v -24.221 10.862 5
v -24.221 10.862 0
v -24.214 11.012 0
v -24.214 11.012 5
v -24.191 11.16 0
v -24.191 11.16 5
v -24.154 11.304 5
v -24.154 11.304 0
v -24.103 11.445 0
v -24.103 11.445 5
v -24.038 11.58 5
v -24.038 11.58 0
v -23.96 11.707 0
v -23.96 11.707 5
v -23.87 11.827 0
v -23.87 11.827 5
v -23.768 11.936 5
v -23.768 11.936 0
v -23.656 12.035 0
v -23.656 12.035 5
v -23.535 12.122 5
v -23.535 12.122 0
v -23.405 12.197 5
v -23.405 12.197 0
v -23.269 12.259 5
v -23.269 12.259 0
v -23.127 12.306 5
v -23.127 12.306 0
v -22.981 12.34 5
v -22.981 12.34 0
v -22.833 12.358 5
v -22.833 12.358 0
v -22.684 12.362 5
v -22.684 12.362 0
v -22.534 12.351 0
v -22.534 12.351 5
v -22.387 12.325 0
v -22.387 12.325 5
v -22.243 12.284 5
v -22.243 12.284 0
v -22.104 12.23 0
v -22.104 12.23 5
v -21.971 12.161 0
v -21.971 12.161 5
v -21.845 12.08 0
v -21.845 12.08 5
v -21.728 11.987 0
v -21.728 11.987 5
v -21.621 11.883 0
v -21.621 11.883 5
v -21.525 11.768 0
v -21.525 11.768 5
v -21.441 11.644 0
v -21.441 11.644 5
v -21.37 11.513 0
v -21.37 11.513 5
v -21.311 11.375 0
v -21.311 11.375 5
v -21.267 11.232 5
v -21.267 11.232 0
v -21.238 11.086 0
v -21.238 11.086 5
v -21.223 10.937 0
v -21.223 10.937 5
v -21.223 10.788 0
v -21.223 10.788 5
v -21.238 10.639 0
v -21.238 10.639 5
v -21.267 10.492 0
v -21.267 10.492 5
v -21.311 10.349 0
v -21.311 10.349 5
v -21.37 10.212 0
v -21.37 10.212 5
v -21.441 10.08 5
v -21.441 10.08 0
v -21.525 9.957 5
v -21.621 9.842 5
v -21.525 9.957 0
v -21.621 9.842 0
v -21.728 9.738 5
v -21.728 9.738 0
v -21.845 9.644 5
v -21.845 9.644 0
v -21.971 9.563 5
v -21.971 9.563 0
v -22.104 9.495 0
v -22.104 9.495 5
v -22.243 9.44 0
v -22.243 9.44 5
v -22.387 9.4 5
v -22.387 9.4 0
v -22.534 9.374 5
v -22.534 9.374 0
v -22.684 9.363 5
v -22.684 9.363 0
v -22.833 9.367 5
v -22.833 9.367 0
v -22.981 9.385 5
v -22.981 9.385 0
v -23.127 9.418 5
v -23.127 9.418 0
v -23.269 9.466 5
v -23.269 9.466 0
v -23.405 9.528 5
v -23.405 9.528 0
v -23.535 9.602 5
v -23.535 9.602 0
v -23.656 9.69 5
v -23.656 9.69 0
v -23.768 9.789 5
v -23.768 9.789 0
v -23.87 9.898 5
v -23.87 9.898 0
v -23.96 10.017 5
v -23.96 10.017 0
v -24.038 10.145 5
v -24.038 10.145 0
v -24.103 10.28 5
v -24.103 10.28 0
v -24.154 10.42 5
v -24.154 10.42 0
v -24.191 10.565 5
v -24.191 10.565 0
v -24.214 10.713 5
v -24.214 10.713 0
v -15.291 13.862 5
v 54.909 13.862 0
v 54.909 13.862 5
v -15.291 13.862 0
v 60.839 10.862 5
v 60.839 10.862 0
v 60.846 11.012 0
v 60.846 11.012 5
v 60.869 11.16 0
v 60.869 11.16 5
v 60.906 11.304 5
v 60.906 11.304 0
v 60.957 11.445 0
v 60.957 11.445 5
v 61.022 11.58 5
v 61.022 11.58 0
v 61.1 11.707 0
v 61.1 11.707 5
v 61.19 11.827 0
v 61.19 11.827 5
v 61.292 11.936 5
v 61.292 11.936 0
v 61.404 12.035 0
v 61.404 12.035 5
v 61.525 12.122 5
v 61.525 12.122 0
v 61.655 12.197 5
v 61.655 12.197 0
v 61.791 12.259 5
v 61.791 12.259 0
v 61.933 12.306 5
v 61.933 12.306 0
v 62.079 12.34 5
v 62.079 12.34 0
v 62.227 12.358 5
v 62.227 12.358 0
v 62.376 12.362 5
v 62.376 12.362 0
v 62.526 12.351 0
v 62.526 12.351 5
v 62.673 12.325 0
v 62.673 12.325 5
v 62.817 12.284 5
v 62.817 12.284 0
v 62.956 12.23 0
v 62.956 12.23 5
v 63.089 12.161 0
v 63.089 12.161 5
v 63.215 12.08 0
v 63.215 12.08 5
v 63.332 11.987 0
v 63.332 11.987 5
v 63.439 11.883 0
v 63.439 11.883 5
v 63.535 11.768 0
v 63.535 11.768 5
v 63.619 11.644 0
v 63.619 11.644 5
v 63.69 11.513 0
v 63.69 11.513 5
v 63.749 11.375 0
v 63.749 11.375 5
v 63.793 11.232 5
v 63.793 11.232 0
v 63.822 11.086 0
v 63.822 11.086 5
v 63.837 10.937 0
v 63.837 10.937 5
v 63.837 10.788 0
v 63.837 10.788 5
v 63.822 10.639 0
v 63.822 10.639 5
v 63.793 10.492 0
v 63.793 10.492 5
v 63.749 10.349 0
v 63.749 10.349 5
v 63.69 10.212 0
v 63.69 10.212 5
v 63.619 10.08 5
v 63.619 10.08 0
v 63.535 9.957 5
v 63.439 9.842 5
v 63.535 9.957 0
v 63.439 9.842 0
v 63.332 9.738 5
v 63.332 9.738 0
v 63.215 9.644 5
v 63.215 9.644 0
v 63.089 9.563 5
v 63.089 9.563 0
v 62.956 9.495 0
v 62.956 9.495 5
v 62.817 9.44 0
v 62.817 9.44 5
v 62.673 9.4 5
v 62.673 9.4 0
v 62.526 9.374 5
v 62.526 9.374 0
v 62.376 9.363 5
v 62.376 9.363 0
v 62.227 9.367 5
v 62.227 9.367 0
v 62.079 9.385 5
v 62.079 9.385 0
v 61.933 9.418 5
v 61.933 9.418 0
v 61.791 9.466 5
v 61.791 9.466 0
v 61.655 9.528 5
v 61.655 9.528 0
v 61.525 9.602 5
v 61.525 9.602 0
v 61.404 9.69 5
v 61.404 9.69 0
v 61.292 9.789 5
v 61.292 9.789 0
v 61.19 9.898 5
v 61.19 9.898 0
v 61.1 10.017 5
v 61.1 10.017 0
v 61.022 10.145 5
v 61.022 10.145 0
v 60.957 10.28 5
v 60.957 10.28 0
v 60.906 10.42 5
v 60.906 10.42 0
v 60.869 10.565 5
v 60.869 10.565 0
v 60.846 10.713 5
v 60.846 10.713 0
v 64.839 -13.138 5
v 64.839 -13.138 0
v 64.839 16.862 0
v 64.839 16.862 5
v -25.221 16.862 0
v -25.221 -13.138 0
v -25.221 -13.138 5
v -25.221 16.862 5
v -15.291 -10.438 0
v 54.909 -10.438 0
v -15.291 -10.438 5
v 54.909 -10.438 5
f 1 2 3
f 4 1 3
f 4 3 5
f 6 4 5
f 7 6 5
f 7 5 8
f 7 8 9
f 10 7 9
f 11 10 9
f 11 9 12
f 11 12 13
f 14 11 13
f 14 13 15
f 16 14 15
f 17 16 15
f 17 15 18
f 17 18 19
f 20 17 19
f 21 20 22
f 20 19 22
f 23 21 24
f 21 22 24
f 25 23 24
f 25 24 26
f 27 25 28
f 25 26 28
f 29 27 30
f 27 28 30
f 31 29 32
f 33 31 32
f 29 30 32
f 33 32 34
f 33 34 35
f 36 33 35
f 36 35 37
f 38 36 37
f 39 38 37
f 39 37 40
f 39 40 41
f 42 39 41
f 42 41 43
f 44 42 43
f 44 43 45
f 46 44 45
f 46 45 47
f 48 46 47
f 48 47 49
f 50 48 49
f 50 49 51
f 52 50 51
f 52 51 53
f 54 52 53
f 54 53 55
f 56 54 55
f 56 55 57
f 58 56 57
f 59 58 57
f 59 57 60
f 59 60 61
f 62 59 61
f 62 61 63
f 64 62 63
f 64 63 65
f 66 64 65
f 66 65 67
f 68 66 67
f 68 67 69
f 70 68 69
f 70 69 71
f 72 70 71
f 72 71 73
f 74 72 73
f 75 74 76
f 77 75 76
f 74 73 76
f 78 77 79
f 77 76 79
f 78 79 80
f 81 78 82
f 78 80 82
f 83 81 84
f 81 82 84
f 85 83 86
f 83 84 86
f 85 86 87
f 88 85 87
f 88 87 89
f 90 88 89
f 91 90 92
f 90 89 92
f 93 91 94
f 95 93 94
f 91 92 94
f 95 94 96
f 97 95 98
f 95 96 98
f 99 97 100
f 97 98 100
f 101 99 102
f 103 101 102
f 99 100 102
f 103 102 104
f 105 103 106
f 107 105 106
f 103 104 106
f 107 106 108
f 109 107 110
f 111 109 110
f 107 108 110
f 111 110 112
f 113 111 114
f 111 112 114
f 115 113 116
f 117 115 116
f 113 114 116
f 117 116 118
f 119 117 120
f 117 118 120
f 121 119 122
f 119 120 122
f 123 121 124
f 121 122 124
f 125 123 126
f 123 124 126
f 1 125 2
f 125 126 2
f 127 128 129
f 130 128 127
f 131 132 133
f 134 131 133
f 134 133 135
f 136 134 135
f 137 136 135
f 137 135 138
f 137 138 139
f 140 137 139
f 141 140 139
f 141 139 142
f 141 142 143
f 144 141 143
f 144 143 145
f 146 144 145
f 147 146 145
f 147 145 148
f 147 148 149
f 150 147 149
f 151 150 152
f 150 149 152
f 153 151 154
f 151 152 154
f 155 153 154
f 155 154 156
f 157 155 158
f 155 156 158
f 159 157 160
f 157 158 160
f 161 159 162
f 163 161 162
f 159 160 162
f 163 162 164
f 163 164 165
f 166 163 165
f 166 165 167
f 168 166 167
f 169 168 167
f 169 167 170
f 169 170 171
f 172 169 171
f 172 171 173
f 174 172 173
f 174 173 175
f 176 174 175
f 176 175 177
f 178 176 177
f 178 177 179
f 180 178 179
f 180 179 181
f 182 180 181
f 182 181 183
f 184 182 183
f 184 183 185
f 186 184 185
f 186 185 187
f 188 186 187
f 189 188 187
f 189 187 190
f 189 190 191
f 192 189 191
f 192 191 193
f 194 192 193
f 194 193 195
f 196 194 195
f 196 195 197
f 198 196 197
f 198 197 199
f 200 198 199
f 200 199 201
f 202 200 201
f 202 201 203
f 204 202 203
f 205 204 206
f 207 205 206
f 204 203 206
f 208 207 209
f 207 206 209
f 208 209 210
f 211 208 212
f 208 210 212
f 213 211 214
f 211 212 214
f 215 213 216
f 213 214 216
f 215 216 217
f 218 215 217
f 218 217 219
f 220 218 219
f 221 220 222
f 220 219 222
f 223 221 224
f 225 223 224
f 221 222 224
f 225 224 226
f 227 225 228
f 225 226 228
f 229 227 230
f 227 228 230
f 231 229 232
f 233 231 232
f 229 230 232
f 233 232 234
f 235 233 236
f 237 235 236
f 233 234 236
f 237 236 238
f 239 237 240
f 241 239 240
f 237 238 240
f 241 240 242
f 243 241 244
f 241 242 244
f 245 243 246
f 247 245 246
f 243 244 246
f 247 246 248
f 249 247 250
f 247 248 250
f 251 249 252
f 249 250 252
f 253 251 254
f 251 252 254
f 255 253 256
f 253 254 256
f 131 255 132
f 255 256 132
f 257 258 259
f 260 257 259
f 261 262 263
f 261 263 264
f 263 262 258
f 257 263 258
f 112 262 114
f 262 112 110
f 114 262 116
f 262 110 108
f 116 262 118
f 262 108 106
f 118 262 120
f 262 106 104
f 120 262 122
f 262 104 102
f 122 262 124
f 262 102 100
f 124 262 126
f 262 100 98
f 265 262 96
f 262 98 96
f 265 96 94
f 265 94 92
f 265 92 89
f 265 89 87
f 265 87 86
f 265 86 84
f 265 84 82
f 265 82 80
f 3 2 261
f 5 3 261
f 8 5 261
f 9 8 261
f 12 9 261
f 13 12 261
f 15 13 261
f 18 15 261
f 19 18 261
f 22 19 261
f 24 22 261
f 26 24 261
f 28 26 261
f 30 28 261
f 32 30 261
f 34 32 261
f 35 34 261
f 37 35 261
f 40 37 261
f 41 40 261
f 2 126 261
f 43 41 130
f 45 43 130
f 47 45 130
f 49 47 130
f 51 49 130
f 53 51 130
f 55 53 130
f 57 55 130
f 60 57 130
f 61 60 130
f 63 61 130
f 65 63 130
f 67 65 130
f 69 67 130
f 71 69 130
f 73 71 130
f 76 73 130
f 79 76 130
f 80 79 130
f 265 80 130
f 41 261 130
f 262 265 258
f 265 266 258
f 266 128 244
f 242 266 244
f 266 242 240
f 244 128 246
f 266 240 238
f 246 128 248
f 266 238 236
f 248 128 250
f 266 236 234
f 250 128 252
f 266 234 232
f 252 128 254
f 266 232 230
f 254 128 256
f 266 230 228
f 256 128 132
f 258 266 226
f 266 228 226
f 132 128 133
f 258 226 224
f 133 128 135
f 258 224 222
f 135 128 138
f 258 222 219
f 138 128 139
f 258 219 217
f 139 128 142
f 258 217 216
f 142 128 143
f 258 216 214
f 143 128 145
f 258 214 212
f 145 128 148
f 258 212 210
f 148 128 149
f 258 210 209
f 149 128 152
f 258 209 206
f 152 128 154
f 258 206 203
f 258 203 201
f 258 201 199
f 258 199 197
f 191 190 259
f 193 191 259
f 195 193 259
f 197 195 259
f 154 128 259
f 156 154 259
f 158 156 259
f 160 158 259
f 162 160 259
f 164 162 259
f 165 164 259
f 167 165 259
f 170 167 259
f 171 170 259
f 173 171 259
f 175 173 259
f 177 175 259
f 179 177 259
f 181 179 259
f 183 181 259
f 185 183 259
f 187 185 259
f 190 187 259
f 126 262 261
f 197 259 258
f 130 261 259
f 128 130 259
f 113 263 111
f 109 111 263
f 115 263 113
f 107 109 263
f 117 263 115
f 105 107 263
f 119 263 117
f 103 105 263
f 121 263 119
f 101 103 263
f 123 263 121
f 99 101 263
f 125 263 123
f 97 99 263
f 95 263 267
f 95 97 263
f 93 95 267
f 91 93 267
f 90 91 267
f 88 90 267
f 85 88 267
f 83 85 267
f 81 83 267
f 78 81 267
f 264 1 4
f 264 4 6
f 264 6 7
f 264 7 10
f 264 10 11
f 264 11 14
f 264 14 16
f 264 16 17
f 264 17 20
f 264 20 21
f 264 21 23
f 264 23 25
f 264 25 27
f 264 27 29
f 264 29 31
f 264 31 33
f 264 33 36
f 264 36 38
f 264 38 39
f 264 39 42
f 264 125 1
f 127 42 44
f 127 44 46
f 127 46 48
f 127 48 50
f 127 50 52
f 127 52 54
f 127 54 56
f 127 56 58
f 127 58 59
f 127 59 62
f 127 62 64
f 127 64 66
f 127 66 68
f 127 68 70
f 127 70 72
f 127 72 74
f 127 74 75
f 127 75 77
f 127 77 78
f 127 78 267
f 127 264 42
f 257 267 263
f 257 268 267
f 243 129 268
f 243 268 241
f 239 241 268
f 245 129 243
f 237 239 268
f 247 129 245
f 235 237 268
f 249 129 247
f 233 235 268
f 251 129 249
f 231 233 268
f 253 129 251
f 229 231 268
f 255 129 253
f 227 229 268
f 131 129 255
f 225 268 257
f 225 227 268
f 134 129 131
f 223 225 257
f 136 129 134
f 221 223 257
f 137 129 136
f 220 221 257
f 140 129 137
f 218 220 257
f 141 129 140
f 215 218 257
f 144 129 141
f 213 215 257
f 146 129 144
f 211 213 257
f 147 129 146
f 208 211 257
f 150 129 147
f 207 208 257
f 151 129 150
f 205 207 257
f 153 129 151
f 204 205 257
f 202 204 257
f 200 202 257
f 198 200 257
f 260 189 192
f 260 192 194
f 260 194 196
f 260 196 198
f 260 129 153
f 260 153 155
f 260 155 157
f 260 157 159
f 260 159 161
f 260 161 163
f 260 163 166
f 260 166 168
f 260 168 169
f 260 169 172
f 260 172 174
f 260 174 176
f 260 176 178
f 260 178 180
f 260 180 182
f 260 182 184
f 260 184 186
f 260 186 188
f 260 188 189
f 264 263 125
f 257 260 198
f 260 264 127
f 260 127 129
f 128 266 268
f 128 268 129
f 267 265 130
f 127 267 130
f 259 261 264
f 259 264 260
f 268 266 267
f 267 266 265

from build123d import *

# Parameters (mm, degrees)
ESBO_O1_W                = 90.06
ESBO_O1_H                = 30
RESSALTO_EXTRUS_O1_DEPTH = 5
ESBO_O2_W                = 70.2
ESBO_O2_H                = 24.3
CORTE_EXTRUS_O1_DEPTH    = 6
ESBO_O4_R                = 1.5
CORTE_EXTRUS_O2_DEPTH    = 10


with BuildPart() as part:
    # Esboço1 → Ressalto-extrusão1 (new body)
    with BuildSketch(Plane.XY):
        with Locations((19.809040323, 1.862332774)):
            Rectangle(ESBO_O1_W, ESBO_O1_H)
    extrude(amount=RESSALTO_EXTRUS_O1_DEPTH)

    # Esboço2 → Corte-extrusão1 (cut, through all)
    with BuildSketch(Plane(origin=(0, 0, 0), x_dir=(-1, 0, 0), z_dir=(0, 0, -1))):
        with Locations((-19.809040323, 1.712332774)):
            Rectangle(ESBO_O2_W, ESBO_O2_H)
    extrude(amount=-CORTE_EXTRUS_O1_DEPTH, mode=Mode.SUBTRACT)

    # Esboço4 → Corte-extrusão2 (cut)
    with BuildSketch(Plane(origin=(0, 0, 0), x_dir=(-1, 0, 0), z_dir=(0, 0, -1))):
        with Locations((22.720959677, 10.862332774)):
            Circle(ESBO_O4_R)
        with Locations((-62.339040323, 10.862332774)):
            Circle(ESBO_O4_R)
    extrude(amount=-CORTE_EXTRUS_O2_DEPTH, mode=Mode.SUBTRACT)


solid = part.part
